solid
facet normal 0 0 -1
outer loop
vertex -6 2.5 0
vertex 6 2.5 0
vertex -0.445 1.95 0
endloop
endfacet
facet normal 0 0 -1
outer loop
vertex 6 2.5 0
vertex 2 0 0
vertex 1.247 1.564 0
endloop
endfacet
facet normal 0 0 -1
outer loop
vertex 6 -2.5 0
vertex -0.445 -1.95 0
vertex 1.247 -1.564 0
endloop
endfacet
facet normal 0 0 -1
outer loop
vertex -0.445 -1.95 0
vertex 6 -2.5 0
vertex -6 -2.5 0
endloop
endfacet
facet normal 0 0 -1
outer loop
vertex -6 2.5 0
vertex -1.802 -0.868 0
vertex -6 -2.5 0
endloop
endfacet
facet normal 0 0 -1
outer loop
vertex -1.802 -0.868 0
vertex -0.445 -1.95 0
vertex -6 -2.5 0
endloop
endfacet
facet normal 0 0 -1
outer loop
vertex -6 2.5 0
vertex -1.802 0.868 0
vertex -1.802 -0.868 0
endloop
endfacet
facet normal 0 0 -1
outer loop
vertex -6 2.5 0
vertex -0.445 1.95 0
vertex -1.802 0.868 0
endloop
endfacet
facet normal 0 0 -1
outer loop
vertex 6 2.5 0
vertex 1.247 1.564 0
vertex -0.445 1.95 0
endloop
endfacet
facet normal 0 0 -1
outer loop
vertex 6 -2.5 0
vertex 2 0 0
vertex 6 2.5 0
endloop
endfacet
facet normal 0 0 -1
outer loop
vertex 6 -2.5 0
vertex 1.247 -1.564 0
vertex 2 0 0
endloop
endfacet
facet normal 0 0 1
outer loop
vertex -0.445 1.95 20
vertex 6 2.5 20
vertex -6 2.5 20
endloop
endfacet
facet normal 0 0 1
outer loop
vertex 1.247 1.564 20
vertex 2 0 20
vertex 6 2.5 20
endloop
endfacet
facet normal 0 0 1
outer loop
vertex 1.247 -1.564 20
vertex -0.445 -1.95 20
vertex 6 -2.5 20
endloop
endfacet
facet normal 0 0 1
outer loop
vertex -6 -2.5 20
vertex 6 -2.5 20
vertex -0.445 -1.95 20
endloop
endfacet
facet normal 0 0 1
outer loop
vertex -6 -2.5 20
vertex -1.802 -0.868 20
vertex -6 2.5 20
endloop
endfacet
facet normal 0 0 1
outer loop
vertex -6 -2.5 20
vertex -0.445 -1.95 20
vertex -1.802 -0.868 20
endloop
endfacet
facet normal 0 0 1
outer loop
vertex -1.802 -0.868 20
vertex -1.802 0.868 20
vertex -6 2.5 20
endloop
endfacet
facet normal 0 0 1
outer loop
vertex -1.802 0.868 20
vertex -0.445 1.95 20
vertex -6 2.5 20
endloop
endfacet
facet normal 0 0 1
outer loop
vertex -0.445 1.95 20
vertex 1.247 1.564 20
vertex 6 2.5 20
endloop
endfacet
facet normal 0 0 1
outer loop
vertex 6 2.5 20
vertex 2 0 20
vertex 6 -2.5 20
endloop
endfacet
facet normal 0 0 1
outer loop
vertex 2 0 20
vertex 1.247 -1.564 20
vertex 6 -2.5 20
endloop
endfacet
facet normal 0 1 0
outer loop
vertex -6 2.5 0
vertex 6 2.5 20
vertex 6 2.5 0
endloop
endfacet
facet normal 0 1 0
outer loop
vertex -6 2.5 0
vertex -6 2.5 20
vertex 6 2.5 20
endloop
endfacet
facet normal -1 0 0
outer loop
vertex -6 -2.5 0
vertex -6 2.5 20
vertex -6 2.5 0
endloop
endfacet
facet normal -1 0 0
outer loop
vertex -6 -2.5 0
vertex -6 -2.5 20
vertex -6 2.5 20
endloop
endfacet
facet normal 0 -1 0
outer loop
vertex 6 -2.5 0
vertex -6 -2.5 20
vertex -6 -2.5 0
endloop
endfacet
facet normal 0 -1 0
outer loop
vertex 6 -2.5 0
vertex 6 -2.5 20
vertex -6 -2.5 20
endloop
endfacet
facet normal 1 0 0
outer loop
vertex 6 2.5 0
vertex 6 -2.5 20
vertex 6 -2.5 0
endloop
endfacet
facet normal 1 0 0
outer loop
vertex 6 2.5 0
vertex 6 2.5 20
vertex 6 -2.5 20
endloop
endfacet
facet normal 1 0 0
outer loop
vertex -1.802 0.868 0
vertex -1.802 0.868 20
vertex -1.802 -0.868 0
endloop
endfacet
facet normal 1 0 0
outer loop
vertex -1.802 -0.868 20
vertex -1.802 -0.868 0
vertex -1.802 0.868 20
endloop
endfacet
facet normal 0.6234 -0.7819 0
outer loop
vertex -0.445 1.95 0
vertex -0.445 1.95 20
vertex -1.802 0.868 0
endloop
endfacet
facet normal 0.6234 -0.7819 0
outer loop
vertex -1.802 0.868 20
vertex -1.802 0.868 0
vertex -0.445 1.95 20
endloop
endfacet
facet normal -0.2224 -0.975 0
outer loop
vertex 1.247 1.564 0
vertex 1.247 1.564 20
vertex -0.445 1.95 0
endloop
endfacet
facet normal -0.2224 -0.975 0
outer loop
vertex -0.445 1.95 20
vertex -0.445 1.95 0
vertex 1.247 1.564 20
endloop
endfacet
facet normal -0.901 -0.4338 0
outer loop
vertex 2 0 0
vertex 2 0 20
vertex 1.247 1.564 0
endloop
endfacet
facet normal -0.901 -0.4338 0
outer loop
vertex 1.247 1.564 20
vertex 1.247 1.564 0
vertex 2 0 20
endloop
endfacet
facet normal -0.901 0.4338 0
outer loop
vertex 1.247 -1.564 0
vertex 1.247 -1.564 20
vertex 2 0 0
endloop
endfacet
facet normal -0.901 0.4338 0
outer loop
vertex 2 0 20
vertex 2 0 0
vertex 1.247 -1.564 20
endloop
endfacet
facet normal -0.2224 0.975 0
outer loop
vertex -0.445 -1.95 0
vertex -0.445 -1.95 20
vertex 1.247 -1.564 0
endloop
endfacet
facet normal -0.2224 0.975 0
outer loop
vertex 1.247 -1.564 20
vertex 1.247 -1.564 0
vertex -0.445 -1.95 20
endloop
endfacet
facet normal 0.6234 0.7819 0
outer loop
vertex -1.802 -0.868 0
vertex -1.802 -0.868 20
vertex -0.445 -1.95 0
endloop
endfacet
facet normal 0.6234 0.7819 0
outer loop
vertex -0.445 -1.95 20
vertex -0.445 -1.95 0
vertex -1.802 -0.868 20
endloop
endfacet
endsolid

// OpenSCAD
//linear_extrude(height=20) square([12,5]);
linear_extrude(height=20)
difference() {
    square([12,5],center=true);
    circle(2);
}
